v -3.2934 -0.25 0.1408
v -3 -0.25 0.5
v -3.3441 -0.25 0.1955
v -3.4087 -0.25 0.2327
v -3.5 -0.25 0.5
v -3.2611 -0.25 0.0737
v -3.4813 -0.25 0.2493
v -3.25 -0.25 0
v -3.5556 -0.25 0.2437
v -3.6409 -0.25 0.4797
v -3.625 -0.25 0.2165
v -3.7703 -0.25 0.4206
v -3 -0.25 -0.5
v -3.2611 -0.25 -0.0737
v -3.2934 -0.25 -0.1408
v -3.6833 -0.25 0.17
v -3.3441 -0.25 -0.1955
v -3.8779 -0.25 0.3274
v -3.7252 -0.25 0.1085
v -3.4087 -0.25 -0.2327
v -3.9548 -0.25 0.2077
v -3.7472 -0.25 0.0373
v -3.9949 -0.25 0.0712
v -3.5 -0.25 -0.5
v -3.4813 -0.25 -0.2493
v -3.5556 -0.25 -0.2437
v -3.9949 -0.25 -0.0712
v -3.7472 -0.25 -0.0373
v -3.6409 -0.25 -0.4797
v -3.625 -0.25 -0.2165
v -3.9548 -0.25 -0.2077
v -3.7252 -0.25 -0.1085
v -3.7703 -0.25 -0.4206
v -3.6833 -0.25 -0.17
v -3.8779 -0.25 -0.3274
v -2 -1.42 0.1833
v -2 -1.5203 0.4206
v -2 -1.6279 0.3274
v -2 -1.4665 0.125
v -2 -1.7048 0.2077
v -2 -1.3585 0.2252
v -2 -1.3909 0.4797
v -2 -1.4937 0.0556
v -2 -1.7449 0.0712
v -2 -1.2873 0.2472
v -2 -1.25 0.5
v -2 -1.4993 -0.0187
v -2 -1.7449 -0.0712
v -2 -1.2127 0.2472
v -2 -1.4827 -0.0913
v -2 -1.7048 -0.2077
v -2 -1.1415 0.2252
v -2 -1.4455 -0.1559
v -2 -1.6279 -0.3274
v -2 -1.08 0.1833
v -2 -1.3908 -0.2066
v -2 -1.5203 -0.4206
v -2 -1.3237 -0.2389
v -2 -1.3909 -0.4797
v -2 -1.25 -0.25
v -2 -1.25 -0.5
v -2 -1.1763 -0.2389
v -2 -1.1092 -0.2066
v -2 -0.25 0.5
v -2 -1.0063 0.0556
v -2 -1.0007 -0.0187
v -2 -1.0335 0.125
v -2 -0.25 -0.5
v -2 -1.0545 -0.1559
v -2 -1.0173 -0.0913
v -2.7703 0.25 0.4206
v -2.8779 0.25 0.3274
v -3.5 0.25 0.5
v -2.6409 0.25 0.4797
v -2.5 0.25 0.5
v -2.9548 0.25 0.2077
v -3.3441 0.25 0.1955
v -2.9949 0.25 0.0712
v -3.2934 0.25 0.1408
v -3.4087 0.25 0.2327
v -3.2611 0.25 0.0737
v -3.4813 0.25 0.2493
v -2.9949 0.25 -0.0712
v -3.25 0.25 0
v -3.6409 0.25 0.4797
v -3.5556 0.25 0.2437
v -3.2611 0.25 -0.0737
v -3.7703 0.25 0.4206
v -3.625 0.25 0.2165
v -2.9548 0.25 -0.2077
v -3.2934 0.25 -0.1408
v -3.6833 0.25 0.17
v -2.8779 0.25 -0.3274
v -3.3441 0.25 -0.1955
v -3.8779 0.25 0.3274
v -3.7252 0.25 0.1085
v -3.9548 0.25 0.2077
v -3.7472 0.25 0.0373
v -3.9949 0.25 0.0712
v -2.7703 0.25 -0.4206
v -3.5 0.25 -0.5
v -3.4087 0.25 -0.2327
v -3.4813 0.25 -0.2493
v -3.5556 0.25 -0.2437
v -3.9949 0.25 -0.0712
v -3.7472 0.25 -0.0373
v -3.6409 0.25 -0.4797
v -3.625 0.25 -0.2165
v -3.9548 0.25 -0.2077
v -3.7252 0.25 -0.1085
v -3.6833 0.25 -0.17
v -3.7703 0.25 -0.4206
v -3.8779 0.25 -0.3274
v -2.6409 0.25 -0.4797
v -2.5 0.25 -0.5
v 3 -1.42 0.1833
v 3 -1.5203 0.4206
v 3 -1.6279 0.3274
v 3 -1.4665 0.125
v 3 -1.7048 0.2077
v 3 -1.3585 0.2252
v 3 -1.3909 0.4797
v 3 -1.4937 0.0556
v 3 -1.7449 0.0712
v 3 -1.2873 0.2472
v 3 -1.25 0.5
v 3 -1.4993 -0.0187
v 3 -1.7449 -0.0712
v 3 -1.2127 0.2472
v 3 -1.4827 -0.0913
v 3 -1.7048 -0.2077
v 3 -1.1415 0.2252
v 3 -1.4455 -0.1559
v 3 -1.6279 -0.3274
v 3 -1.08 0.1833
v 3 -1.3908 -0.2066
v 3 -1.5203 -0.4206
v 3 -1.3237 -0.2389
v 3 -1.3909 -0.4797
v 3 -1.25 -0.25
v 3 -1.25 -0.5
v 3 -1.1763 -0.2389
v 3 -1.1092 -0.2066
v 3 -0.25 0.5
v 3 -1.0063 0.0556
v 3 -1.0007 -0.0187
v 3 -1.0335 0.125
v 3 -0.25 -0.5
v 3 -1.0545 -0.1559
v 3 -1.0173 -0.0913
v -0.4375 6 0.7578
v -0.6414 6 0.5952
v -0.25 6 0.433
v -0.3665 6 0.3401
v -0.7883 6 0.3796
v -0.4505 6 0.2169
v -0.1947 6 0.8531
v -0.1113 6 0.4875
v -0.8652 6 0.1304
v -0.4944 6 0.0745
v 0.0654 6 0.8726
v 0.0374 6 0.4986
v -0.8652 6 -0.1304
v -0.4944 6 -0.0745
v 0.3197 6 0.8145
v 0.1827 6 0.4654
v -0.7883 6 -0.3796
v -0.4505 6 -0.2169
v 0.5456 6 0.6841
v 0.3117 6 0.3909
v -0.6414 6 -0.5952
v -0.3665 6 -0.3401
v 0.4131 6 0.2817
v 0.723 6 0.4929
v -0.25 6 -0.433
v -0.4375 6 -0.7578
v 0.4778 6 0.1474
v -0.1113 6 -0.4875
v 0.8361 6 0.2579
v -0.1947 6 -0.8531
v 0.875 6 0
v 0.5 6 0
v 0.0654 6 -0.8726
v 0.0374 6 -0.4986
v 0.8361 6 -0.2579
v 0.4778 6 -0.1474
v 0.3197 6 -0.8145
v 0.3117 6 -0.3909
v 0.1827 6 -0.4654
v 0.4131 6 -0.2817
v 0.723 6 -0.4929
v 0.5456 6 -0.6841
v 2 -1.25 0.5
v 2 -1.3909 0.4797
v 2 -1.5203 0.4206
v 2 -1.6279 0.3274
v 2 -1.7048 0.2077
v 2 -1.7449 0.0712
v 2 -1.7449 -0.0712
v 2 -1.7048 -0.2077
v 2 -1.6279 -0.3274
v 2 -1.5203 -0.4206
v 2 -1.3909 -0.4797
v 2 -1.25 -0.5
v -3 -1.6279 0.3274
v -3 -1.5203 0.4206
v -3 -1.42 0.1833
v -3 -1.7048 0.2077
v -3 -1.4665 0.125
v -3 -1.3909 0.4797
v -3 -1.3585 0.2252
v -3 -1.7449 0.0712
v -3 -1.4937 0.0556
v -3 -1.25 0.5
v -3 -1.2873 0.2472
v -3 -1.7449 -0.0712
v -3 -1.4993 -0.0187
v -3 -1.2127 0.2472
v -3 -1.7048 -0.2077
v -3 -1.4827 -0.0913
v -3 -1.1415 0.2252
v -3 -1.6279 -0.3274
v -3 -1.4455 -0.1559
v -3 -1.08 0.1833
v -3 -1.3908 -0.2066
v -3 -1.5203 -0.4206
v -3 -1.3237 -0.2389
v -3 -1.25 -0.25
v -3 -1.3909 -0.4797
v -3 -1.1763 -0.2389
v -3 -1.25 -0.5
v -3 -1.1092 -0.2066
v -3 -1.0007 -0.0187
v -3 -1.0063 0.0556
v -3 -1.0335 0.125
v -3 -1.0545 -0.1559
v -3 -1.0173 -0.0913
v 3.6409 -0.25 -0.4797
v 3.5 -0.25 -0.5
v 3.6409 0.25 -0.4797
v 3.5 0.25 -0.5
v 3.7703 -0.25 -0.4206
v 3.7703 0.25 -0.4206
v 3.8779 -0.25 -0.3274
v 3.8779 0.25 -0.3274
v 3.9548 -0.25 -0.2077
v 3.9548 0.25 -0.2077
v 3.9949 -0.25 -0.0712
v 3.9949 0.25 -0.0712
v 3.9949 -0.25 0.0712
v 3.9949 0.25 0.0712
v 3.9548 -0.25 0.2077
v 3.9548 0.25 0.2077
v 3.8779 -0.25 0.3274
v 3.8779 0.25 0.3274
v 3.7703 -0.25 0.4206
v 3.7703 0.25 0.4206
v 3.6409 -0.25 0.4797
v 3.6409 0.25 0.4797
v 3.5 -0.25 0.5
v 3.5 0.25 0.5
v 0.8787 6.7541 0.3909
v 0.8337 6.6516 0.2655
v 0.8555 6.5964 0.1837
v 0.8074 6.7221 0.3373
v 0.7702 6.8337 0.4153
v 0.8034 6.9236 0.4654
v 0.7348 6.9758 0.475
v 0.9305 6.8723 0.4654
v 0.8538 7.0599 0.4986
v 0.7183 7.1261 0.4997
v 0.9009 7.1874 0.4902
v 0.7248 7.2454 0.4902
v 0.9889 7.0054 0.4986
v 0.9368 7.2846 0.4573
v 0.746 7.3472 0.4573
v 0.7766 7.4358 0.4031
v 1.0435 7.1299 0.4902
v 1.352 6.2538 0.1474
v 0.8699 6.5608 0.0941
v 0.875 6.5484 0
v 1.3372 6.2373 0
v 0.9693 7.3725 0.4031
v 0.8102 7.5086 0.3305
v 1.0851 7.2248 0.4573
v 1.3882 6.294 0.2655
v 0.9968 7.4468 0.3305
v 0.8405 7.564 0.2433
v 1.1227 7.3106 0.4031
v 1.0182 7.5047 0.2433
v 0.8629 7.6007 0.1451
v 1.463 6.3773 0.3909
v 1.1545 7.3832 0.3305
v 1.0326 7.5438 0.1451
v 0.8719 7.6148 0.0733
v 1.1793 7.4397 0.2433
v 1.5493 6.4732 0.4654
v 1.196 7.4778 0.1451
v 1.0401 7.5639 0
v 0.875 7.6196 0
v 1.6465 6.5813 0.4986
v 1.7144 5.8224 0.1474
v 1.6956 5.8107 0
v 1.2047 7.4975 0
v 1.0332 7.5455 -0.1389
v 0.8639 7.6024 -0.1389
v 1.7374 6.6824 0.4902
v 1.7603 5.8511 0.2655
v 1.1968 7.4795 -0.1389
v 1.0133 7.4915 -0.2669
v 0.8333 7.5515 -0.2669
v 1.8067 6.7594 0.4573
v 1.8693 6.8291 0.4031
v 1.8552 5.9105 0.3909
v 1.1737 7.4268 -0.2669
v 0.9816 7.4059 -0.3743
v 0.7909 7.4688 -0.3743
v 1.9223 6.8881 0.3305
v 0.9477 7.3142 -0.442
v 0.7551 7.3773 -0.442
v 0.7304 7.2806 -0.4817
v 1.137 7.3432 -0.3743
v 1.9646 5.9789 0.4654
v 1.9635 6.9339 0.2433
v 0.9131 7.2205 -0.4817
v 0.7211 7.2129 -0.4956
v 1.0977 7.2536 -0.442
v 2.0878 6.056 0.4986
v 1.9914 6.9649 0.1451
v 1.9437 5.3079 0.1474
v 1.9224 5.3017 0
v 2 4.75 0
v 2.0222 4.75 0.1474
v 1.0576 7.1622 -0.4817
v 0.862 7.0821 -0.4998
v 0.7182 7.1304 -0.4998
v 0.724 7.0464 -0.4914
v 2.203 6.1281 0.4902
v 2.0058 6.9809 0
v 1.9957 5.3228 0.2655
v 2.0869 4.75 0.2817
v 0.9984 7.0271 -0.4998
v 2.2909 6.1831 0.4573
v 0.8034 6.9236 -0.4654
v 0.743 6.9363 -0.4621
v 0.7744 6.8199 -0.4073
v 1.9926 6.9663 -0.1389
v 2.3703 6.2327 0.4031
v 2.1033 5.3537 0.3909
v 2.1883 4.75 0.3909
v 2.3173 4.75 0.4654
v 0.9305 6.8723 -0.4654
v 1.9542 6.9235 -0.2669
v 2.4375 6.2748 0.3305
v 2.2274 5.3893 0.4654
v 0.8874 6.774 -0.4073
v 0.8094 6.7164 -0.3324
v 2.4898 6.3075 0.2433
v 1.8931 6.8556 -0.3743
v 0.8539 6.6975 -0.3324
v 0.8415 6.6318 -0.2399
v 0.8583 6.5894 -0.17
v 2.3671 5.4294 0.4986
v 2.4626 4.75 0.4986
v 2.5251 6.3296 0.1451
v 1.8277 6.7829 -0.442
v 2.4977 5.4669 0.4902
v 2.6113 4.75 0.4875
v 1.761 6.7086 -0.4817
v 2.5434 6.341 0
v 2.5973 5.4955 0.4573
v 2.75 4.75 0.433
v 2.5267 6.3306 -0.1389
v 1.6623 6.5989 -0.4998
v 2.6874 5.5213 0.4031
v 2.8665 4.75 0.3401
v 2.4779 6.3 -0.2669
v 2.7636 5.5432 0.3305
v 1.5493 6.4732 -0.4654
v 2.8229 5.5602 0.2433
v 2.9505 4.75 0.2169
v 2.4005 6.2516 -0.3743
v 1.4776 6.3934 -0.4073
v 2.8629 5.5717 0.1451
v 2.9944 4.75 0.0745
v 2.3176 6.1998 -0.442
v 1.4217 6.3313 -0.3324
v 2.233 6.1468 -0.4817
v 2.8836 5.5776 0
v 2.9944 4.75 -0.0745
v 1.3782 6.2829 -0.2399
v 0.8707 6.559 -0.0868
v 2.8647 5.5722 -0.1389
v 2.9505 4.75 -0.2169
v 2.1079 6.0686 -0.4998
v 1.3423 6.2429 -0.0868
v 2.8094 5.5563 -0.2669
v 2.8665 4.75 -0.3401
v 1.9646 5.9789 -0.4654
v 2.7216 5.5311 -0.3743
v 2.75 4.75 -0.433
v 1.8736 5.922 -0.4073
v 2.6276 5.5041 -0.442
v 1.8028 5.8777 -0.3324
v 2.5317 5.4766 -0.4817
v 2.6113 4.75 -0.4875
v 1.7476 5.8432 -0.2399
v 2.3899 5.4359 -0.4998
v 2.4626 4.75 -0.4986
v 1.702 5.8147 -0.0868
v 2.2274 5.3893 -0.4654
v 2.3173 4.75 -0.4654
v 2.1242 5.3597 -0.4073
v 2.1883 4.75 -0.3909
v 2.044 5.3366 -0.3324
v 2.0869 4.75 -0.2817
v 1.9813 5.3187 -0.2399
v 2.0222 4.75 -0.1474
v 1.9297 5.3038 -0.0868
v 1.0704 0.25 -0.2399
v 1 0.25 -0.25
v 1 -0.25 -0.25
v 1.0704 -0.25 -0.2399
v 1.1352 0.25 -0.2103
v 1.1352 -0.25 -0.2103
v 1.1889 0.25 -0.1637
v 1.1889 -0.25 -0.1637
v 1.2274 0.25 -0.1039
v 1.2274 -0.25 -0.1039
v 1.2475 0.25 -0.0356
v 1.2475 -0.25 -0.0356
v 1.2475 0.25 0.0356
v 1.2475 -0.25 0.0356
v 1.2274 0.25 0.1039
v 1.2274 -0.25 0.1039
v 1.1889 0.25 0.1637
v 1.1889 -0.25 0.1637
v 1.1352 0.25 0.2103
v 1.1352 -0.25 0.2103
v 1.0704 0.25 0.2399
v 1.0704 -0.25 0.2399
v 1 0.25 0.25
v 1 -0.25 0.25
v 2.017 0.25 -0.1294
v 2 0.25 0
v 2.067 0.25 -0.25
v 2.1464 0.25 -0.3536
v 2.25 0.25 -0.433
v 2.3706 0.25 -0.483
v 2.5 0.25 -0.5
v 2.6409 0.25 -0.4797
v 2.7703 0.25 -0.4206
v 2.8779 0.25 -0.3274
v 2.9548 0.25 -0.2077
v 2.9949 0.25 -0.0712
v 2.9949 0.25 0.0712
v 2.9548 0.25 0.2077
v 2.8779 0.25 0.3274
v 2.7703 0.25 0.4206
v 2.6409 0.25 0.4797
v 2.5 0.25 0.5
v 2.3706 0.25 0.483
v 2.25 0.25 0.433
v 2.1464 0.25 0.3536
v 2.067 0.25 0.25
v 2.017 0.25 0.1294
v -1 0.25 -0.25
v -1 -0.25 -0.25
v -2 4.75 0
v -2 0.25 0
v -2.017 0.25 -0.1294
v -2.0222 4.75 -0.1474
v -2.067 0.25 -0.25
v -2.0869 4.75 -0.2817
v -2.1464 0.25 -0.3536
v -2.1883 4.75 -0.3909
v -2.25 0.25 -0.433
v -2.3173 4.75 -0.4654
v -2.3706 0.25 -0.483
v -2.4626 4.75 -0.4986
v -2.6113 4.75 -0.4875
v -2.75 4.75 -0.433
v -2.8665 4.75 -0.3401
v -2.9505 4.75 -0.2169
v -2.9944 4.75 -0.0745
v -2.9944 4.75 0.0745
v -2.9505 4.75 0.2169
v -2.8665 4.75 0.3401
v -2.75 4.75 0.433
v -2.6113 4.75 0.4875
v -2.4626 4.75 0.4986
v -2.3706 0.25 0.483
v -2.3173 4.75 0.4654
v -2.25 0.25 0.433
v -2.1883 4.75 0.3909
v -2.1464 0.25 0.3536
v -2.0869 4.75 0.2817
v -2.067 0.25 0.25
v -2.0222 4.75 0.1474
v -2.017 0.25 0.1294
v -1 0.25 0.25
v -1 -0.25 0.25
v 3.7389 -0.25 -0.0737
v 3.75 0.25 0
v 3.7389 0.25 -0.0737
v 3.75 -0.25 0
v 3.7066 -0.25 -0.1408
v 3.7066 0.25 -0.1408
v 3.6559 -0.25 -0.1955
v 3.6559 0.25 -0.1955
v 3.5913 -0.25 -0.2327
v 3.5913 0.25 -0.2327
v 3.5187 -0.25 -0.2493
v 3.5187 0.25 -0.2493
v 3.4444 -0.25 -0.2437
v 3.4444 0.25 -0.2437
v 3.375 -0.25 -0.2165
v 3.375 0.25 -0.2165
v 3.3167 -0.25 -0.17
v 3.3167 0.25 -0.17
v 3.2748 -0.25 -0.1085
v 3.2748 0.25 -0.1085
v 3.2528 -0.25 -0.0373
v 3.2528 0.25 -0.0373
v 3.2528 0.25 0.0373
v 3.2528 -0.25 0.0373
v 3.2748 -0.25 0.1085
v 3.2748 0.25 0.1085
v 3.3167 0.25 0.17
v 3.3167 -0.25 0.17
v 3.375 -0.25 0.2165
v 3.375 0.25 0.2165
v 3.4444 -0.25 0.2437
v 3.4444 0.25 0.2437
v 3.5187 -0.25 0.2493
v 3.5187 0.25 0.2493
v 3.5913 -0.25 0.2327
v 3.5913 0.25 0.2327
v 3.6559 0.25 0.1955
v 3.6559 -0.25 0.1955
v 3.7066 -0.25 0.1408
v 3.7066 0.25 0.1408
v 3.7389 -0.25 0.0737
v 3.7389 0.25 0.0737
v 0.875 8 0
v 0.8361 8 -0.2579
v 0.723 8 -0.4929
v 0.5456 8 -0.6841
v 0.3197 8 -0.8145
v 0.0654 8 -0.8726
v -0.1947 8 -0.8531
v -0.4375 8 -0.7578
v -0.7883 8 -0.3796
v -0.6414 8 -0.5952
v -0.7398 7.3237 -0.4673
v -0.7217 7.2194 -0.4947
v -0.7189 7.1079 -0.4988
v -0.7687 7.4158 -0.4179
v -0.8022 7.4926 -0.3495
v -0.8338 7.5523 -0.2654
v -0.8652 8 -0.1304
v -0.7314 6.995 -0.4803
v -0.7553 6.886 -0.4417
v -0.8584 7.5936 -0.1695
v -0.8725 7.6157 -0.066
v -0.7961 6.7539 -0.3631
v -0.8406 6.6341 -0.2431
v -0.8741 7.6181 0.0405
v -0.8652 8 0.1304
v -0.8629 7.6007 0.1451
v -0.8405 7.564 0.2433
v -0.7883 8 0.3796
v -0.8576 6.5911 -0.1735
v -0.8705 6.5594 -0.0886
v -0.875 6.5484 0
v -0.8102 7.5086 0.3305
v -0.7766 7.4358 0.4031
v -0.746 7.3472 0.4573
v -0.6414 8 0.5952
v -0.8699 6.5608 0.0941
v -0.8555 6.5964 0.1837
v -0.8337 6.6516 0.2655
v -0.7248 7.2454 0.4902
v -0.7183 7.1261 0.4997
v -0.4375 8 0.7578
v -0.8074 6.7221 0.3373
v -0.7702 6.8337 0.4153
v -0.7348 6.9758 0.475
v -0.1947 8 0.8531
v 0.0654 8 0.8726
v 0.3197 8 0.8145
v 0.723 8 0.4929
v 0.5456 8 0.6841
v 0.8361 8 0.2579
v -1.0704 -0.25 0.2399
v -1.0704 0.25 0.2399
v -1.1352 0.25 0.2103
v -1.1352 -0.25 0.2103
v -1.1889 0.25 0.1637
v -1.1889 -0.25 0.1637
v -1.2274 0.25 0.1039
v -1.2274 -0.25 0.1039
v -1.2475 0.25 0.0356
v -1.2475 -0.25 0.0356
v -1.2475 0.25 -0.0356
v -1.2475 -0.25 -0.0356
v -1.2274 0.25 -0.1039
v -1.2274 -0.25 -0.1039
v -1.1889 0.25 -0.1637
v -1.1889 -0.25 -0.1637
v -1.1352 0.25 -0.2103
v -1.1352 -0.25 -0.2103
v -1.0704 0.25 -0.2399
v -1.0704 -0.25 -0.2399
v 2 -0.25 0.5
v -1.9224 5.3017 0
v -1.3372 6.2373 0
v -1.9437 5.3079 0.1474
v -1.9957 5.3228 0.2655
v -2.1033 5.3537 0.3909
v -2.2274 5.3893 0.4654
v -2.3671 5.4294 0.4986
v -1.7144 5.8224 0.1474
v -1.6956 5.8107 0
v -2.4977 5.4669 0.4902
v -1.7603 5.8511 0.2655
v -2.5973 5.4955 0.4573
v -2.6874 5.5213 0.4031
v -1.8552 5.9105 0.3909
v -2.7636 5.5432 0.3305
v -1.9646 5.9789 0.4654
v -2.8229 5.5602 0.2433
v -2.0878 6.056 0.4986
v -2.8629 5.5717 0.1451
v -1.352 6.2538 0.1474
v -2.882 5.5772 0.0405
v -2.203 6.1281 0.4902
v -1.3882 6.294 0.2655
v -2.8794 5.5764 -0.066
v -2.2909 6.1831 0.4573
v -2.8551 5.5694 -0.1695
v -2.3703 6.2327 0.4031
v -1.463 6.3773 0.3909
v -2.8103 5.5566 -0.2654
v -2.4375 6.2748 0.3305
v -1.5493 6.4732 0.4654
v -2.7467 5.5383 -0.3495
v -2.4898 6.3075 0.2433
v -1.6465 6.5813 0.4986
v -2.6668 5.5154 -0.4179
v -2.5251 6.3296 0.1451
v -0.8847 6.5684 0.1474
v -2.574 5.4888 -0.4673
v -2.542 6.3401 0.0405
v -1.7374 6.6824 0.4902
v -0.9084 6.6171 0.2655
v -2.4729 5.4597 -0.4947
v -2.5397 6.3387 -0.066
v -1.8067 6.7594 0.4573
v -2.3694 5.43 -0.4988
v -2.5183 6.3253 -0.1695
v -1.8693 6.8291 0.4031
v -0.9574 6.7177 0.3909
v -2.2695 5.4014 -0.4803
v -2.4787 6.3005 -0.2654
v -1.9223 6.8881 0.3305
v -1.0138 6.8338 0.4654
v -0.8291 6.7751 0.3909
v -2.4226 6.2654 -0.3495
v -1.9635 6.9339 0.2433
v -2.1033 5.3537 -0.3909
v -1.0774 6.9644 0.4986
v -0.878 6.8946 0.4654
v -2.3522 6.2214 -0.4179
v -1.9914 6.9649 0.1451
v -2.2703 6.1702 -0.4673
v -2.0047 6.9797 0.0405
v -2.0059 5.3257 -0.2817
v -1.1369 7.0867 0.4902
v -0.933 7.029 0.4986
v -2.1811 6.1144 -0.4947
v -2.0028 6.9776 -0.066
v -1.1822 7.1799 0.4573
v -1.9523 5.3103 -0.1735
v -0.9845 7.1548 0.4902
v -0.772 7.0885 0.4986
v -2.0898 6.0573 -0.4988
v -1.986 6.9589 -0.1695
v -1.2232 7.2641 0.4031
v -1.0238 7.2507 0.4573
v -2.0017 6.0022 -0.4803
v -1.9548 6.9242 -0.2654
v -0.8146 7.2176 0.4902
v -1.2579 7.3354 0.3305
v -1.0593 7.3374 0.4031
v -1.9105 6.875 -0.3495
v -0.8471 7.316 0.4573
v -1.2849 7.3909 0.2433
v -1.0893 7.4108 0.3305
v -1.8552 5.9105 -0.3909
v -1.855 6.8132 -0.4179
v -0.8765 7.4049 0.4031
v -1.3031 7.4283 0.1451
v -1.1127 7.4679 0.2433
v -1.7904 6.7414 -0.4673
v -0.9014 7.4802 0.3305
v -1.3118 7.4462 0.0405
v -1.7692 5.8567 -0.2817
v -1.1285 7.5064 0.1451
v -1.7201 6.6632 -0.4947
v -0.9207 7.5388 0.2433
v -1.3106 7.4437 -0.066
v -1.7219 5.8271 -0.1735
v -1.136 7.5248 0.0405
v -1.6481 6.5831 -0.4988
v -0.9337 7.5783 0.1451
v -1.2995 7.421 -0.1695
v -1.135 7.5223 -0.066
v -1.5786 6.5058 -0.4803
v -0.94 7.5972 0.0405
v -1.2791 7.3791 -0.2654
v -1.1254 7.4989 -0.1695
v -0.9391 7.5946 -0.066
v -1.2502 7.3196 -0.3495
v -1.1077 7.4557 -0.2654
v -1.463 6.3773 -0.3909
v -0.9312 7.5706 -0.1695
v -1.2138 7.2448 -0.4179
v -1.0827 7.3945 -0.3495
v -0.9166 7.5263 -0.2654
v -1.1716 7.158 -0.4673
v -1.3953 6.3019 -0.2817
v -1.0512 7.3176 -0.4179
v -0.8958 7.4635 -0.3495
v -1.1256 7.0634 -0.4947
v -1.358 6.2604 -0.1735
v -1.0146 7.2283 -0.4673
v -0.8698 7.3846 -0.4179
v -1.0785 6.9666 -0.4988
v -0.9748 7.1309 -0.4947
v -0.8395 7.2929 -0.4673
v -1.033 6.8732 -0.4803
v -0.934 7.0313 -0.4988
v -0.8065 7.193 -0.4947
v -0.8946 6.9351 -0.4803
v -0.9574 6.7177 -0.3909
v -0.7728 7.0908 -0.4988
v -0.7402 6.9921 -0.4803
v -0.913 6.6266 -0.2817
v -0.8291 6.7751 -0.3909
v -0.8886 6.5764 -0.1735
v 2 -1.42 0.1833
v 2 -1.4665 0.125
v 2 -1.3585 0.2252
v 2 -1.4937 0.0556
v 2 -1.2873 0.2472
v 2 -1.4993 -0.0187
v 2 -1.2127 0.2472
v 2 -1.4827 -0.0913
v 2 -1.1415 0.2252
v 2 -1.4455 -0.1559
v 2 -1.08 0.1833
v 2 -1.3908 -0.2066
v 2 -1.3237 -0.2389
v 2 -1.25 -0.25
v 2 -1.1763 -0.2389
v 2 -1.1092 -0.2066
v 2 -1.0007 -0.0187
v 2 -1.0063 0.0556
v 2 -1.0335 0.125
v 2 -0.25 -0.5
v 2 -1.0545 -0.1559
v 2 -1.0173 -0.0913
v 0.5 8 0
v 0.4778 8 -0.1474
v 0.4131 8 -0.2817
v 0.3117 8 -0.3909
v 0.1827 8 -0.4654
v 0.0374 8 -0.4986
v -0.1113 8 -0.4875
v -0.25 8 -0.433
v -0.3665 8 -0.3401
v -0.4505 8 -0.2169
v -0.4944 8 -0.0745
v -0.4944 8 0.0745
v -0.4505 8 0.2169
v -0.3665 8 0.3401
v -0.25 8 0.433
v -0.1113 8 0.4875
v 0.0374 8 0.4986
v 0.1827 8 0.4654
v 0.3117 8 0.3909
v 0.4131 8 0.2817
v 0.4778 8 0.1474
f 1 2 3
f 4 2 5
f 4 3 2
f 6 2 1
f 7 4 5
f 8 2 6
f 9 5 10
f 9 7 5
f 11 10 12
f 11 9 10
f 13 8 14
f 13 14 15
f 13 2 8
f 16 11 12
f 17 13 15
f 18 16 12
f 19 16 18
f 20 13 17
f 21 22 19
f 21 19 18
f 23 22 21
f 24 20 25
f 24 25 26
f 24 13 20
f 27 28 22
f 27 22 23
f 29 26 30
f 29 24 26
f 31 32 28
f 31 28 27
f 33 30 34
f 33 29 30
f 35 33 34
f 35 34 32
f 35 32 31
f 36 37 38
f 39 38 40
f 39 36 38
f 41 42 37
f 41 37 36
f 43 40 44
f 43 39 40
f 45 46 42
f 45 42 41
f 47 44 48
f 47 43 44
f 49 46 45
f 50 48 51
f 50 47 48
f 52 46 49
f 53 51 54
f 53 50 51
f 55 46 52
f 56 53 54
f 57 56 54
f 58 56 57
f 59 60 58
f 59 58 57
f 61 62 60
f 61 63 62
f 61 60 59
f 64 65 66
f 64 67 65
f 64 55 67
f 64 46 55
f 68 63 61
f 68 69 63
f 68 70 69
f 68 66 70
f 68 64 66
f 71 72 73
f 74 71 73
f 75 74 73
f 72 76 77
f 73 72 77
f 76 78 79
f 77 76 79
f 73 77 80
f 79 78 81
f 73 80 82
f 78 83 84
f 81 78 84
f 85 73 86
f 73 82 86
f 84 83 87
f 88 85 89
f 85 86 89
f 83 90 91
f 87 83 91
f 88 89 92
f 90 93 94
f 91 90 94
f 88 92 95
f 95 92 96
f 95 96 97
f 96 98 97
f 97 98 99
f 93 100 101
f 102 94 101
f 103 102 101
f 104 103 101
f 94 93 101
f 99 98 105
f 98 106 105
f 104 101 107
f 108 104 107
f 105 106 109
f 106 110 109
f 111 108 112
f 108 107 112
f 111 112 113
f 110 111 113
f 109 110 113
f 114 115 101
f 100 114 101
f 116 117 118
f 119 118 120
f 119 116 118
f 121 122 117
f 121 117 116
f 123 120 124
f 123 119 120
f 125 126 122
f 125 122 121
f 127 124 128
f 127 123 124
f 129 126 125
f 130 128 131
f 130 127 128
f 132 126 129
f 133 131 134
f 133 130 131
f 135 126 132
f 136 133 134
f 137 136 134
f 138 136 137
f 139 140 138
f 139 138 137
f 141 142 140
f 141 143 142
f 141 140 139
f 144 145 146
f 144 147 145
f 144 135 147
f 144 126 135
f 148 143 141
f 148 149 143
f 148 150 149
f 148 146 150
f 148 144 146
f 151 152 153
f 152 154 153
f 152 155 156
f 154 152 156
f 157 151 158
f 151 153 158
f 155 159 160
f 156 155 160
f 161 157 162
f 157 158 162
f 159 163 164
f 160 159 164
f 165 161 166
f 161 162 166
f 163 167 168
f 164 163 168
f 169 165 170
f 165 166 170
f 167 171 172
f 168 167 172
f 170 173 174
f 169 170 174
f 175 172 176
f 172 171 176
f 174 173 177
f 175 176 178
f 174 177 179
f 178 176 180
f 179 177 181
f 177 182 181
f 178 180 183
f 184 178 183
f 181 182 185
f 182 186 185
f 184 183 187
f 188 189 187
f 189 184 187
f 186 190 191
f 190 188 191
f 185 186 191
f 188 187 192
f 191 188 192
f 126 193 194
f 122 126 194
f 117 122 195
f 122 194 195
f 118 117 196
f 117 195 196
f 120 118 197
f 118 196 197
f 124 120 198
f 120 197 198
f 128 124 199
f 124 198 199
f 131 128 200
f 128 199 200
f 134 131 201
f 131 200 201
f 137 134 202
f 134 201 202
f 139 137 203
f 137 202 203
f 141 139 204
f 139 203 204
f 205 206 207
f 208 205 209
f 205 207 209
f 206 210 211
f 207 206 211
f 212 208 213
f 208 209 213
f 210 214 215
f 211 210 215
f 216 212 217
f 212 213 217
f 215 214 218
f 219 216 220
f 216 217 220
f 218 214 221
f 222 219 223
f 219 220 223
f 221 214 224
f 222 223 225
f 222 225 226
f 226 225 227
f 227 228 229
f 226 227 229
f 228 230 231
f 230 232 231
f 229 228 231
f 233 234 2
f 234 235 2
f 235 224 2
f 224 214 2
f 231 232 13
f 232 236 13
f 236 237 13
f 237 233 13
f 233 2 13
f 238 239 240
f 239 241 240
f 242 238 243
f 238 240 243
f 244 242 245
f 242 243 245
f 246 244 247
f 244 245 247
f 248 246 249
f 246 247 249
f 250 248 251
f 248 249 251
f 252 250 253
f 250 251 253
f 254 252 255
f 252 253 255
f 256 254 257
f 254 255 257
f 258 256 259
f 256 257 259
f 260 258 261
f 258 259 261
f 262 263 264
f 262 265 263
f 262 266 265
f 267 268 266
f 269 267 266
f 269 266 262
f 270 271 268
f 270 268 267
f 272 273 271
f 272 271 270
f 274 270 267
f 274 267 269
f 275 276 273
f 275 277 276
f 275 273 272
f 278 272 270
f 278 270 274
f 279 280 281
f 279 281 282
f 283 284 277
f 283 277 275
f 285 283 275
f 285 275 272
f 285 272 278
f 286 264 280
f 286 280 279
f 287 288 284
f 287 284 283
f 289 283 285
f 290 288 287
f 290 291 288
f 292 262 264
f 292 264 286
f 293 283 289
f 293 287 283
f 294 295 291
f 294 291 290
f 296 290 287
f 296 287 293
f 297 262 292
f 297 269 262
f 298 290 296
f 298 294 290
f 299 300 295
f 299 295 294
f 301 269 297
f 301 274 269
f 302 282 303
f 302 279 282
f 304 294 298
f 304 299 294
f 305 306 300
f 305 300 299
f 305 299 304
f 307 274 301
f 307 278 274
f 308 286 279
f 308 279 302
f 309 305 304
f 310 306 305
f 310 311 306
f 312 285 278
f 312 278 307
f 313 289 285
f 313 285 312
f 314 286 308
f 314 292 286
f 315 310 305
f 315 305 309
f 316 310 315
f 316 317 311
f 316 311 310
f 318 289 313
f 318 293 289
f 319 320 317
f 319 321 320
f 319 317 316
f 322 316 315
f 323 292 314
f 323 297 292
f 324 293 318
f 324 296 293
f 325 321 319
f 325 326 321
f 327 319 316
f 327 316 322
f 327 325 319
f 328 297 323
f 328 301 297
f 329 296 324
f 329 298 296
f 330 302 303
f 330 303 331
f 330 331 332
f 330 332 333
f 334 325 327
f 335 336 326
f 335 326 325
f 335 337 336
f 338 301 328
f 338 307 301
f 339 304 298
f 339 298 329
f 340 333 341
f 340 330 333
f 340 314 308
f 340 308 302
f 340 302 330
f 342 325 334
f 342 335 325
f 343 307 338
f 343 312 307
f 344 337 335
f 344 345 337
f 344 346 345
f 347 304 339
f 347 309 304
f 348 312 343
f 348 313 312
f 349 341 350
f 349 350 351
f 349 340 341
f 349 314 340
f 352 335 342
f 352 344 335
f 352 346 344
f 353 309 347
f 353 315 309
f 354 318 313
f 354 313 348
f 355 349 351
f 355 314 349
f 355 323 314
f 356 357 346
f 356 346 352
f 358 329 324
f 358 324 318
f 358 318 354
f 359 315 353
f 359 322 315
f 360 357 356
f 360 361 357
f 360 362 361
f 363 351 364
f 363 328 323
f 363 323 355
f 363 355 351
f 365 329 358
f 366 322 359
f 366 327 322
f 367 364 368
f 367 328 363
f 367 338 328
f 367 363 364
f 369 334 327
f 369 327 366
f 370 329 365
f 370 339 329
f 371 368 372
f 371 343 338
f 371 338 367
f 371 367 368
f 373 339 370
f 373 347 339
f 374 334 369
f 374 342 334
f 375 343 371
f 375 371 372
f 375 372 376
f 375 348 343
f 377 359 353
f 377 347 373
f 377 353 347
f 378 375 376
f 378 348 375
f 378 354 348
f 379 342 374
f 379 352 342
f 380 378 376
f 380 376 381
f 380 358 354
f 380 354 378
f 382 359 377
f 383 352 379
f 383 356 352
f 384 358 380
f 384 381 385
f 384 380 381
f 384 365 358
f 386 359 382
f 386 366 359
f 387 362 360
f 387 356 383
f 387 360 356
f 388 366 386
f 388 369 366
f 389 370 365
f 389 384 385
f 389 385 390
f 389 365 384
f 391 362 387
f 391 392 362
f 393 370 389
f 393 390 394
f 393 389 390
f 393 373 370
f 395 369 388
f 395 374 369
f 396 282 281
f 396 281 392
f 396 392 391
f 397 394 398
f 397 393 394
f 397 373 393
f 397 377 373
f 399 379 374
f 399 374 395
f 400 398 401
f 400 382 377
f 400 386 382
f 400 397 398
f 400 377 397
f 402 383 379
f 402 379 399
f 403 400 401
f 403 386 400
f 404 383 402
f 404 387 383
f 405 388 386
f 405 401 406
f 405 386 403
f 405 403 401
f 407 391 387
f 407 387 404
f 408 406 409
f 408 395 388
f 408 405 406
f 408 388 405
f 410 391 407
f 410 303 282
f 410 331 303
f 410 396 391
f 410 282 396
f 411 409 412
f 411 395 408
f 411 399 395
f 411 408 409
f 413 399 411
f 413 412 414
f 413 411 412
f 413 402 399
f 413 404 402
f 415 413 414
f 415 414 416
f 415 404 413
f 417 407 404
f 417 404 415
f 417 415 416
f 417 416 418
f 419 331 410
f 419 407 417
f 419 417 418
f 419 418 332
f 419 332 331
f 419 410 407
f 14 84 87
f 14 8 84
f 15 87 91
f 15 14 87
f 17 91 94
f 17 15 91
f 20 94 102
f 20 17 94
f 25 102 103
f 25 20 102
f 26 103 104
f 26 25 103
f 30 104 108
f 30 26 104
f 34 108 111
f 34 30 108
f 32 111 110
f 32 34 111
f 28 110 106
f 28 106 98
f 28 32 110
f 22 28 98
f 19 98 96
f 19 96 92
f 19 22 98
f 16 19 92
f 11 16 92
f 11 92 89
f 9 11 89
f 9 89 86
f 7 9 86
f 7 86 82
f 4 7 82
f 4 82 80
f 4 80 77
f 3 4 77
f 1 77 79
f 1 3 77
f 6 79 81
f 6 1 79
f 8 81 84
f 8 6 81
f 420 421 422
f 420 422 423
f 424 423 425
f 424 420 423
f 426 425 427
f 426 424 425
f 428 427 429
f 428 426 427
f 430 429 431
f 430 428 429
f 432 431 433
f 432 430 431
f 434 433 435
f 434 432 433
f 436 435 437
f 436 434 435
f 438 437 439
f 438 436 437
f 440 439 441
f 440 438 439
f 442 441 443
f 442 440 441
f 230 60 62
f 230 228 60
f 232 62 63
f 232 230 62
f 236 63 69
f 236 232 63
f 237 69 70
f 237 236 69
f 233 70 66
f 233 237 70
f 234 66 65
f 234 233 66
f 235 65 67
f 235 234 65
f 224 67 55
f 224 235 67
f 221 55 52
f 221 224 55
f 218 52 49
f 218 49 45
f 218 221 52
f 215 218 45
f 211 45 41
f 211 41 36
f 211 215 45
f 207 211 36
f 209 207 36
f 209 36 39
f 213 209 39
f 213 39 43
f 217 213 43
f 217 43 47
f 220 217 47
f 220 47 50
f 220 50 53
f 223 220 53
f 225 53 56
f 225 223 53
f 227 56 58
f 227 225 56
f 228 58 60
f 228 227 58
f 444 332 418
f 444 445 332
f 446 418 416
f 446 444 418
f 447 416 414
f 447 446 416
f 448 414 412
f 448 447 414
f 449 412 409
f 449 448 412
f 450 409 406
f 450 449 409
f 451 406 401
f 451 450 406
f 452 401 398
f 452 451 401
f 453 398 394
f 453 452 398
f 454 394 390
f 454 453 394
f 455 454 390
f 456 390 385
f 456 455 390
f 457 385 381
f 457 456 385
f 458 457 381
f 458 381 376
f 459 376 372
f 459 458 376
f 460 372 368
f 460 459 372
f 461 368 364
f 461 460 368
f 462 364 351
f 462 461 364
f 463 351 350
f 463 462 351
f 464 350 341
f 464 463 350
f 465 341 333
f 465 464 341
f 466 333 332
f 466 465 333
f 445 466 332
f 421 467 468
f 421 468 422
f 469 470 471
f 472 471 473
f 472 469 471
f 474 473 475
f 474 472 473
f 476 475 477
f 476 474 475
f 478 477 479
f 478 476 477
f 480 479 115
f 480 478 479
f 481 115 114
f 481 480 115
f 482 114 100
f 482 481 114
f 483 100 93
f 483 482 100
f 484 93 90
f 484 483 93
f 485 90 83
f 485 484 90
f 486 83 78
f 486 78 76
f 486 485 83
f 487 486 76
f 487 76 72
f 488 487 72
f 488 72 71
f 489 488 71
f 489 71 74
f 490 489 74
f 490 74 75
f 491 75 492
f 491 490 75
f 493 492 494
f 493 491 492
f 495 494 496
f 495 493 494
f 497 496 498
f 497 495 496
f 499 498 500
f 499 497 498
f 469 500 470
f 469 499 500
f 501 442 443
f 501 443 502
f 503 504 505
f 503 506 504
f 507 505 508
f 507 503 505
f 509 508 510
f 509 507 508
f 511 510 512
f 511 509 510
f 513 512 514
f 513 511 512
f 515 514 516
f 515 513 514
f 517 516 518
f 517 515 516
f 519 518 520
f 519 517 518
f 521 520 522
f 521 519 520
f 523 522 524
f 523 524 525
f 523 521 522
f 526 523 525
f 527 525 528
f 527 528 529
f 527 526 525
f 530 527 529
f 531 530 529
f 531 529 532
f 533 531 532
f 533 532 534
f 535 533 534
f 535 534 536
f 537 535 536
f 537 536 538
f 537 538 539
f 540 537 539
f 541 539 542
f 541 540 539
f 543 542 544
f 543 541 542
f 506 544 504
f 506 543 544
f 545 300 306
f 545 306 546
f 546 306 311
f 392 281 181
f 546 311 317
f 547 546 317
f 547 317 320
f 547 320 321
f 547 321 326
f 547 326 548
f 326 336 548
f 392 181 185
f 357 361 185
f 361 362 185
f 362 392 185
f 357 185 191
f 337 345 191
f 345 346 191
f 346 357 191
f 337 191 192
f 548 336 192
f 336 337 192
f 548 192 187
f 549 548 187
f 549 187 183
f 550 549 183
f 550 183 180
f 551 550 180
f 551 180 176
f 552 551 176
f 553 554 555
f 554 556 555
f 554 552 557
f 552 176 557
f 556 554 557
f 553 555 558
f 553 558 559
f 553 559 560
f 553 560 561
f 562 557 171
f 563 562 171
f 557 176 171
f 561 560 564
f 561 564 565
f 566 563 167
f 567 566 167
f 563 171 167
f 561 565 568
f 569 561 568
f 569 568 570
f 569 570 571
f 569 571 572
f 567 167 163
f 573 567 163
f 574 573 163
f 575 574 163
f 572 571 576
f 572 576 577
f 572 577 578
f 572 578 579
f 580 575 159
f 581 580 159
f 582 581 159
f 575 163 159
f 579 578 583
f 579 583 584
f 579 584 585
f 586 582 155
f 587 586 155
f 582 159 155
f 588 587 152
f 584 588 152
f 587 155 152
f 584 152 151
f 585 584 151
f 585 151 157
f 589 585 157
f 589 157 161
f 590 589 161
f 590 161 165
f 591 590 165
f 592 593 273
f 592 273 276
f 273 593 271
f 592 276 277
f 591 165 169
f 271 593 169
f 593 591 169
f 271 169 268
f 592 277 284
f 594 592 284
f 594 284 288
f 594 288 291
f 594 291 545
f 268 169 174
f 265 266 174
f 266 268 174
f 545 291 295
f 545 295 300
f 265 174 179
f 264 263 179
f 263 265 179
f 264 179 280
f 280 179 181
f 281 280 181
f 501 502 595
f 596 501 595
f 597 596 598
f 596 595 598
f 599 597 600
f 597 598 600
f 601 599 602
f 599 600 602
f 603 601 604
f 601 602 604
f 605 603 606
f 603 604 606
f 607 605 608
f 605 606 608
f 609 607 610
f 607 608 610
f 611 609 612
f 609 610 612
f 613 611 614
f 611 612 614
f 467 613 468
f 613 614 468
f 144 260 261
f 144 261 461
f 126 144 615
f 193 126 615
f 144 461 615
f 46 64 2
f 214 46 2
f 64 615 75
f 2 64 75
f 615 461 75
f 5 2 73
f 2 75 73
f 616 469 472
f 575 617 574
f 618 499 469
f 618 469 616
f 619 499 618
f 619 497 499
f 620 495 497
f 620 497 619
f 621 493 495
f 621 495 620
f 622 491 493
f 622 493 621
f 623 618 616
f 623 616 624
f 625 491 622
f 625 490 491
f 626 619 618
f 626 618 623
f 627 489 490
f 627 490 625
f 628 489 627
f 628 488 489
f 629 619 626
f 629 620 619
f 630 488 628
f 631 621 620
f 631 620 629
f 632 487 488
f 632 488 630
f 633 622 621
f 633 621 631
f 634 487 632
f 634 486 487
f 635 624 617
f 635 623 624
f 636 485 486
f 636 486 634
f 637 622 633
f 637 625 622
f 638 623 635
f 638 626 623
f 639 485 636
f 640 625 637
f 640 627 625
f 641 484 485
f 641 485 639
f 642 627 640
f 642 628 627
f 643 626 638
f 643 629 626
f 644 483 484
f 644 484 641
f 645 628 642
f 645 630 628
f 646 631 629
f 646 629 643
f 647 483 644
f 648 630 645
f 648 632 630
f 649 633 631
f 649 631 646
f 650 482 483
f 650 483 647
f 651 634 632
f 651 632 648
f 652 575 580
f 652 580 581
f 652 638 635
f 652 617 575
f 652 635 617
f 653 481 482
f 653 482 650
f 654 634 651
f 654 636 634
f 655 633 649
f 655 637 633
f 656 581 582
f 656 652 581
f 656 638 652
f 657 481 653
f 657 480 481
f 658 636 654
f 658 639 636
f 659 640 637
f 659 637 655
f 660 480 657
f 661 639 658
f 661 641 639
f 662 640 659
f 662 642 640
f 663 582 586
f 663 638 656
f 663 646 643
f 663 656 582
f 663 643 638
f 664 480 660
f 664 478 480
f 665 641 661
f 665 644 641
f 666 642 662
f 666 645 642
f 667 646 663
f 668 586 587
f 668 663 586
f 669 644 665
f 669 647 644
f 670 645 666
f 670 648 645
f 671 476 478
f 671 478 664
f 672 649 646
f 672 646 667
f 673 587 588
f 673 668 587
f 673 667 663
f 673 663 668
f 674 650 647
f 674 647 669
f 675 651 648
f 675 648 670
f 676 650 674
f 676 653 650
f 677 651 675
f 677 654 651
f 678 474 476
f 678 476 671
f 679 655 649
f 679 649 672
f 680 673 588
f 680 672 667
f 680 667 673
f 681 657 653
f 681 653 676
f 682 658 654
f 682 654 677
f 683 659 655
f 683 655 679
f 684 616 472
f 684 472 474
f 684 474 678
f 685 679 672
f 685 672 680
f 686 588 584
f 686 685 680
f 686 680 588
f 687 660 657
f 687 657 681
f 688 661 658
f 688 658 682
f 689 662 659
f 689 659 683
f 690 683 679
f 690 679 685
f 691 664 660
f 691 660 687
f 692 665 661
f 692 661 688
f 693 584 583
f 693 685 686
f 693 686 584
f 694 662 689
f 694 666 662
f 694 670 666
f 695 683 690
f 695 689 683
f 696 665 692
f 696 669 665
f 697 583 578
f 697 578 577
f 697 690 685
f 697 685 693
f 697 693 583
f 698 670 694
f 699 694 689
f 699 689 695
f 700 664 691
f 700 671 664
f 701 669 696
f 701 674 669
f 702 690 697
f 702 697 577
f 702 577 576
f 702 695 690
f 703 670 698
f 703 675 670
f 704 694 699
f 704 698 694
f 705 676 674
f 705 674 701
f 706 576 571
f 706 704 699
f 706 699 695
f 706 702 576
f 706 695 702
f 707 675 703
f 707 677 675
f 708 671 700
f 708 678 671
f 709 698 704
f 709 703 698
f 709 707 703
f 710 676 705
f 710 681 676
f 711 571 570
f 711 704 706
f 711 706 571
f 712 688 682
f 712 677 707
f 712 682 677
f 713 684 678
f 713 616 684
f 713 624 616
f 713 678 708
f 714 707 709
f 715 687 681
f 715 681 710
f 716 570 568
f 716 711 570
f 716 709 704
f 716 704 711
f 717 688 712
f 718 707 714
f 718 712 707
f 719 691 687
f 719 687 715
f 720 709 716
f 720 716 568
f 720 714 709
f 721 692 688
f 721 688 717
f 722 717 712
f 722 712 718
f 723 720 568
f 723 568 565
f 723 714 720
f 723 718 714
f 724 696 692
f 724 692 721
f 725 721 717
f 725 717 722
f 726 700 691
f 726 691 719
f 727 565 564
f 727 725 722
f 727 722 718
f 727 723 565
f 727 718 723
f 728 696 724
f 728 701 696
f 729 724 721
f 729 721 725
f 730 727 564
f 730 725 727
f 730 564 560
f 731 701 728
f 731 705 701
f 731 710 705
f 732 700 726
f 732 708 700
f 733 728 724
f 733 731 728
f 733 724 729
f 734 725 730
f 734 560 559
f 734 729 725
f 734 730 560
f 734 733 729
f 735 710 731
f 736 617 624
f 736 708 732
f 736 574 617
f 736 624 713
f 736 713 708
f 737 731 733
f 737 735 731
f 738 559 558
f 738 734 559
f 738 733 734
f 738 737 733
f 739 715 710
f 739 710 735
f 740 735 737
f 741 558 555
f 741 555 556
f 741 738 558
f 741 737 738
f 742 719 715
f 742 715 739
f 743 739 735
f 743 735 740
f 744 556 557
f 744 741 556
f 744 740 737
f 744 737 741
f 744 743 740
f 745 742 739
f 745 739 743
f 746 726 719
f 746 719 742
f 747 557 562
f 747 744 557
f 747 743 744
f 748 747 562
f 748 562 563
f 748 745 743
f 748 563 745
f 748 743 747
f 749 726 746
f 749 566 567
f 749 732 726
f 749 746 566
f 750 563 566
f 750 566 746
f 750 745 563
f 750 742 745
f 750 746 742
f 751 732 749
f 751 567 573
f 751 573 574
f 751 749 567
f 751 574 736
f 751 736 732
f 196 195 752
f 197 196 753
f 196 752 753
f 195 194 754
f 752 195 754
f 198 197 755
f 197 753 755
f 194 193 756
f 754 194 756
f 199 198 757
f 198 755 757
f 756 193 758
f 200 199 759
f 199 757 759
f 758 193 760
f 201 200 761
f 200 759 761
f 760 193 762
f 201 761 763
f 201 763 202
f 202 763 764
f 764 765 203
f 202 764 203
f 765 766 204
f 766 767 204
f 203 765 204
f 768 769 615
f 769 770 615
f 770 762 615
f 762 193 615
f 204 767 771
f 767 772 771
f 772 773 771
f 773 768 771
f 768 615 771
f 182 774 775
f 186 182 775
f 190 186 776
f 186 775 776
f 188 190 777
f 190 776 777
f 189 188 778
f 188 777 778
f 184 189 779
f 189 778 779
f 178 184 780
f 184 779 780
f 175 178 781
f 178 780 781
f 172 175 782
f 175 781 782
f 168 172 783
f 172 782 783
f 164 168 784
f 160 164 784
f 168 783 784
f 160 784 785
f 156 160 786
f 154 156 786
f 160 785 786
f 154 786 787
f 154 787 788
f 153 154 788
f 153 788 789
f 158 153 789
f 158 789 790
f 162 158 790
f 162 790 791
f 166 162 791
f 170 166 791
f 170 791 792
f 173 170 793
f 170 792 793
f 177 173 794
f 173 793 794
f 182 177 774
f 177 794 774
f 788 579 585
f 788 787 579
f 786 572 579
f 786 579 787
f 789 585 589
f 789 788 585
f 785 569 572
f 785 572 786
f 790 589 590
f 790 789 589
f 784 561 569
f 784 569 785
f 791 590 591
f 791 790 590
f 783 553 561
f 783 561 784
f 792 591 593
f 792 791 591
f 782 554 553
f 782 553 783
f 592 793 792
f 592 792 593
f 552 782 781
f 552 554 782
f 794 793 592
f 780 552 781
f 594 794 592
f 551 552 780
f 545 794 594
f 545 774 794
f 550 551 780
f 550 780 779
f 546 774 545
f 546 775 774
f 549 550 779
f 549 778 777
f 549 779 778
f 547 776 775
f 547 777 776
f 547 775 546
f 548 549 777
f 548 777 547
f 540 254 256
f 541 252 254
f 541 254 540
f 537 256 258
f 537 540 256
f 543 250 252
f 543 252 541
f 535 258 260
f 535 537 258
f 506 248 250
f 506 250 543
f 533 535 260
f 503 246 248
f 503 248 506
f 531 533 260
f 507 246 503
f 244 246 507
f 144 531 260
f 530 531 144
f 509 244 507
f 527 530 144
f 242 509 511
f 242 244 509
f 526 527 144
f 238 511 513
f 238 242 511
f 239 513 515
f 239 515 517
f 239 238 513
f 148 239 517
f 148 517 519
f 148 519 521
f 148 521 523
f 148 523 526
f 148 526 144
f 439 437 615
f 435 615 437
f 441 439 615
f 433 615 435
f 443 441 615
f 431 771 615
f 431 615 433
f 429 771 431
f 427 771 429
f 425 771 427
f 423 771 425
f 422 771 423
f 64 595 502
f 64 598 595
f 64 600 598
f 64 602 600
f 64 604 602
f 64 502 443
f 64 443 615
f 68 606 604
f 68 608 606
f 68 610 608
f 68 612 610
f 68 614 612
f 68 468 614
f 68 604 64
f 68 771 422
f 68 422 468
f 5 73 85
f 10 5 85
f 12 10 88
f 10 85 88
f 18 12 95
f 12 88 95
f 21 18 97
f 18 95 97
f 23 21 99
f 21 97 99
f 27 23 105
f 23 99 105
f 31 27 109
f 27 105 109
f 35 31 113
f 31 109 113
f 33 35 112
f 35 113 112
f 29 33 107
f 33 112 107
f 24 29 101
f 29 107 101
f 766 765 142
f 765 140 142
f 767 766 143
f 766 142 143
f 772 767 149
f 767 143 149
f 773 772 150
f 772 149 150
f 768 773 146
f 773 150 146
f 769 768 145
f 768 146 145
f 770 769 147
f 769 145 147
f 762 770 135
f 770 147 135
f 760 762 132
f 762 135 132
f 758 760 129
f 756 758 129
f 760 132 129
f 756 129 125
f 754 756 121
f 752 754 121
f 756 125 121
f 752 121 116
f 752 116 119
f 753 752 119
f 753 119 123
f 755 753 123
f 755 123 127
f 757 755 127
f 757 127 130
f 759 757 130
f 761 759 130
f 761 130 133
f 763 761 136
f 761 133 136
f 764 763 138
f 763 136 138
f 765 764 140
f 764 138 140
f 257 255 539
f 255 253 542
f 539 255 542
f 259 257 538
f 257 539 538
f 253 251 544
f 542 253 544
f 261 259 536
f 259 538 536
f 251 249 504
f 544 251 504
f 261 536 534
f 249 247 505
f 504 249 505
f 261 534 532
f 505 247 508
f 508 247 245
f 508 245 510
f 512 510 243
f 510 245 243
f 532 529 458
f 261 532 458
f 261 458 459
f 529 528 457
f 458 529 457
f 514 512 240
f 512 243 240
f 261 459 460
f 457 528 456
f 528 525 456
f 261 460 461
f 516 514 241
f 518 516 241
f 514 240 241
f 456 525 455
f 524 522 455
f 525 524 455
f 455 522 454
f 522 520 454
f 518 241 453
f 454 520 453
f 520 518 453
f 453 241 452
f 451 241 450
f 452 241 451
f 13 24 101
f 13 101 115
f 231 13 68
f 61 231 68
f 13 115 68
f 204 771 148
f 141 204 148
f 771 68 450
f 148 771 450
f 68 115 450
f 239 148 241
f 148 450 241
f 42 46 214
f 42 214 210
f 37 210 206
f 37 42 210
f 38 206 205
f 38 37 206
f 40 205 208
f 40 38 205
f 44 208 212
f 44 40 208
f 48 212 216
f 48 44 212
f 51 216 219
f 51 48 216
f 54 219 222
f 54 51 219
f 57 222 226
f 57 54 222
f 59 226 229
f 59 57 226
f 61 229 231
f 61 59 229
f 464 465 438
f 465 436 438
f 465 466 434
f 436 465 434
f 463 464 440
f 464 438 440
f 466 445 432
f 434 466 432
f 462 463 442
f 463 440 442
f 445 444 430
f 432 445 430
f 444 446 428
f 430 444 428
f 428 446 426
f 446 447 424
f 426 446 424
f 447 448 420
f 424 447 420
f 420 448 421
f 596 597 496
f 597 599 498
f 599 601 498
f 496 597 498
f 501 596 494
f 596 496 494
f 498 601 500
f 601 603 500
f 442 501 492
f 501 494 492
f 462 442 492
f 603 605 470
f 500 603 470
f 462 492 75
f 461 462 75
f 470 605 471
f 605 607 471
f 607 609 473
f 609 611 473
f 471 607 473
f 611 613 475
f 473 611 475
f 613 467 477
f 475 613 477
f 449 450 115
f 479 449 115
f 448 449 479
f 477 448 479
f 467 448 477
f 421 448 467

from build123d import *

# Parameters (mm, degrees)
ESBO_O1_R                = 0.25
RESSALTO_EXTRUS_O1_DEPTH = 0.25
ESBO_O2_R                = 0.5
ESBO_O5_R                = 0.25
RESSALTO_EXTRUS_O2_DEPTH = 0.5
ESBO_O6_R                = 0.875
RESSALTO_EXTRUS_O3_DEPTH = 2
ESBO_O7_R                = 0.5
CORTE_EXTRUS_O1_DEPTH    = 2


with BuildPart() as part:
    # Esboço1 → Ressalto-extrusão1 (new body, symmetric)
    with BuildSketch(Plane(origin=(0, 0, 0), x_dir=(1, 0, 0), z_dir=(0, 1, 0))):
        with BuildLine():
            Line((-3.5, 0.5), (3.5, 0.5))
            ThreePointArc((3.5, 0.5), (4, 0), (3.5, -0.5))
            Line((3.5, -0.5), (-3.5, -0.5))
            ThreePointArc((-3.5, -0.5), (-4, 0), (-3.5, 0.5))
        make_face()
        with Locations((3.5, 0)):
            Circle(ESBO_O1_R, mode=Mode.SUBTRACT)
        with Locations((-3.5, 0)):
            Circle(ESBO_O1_R, mode=Mode.SUBTRACT)
        with BuildLine():
            Line((-1, 0.25), (1, 0.25))
            ThreePointArc((1, 0.25), (1.25, 0), (1, -0.25))
            Line((1, -0.25), (-1, -0.25))
            ThreePointArc((-1, -0.25), (-1.25, 0), (-1, 0.25))
        make_face(mode=Mode.SUBTRACT)
    extrude(amount=RESSALTO_EXTRUS_O1_DEPTH, both=True)

    # Varredura1: sweep along a path in Esboço3
    with BuildLine(Plane.XY) as varredura1_path:
        Line((-2.5, 0.25), (-2.5, 4.75))
        ThreePointArc((-2.5, 4.75), (0, 7.25), (2.5, 4.75))
        Line((2.5, 4.75), (2.5, 0.25))
    # Esboço2 → Varredura1 (sweep)
    with BuildSketch(Plane(origin=(0, 0.25, 0), x_dir=(1, 0, 0), z_dir=(0, 1, 0))):
        with Locations((-2.5, 0)):
            Circle(ESBO_O2_R)
    sweep(path=varredura1_path.line)

    # Esboço5 → Ressalto-extrusão2 (add, symmetric)
    with BuildSketch(Plane(origin=(-2.5, 0, 0), x_dir=(0, 0, -1), z_dir=(1, 0, 0))):
        with BuildLine():
            Line((0.5, -0.25), (-0.5, -0.25))
            Line((-0.5, -0.25), (-0.5, -1.25))
            ThreePointArc((-0.5, -1.25), (0, -1.75), (0.5, -1.25))
            Line((0.5, -1.25), (0.5, -0.25))
        make_face()
        with Locations((0, -1.25)):
            Circle(ESBO_O5_R, mode=Mode.SUBTRACT)
    ressalto_extrus_o2 = extrude(amount=RESSALTO_EXTRUS_O2_DEPTH, both=True)

    # Espelhar1: Ressalto-extrusão2 across plane
    add(ressalto_extrus_o2.mirror(Plane(origin=(0, 0, 0), x_dir=(0, 0, 1), z_dir=(1, 0, 0))))

    # Esboço6 → Ressalto-extrusão3 (add)
    with BuildSketch(Plane(origin=(0, 6, 0), x_dir=(1, 0, 0), z_dir=(0, 1, 0))):
        Circle(ESBO_O6_R)
    extrude(amount=RESSALTO_EXTRUS_O3_DEPTH)

    # Esboço7 → Corte-extrusão1 (cut)
    with BuildSketch(Plane(origin=(0, 8, 0), x_dir=(1, 0, 0), z_dir=(0, 1, 0))):
        Circle(ESBO_O7_R)
    extrude(amount=-CORTE_EXTRUS_O1_DEPTH, mode=Mode.SUBTRACT)


solid = part.part
